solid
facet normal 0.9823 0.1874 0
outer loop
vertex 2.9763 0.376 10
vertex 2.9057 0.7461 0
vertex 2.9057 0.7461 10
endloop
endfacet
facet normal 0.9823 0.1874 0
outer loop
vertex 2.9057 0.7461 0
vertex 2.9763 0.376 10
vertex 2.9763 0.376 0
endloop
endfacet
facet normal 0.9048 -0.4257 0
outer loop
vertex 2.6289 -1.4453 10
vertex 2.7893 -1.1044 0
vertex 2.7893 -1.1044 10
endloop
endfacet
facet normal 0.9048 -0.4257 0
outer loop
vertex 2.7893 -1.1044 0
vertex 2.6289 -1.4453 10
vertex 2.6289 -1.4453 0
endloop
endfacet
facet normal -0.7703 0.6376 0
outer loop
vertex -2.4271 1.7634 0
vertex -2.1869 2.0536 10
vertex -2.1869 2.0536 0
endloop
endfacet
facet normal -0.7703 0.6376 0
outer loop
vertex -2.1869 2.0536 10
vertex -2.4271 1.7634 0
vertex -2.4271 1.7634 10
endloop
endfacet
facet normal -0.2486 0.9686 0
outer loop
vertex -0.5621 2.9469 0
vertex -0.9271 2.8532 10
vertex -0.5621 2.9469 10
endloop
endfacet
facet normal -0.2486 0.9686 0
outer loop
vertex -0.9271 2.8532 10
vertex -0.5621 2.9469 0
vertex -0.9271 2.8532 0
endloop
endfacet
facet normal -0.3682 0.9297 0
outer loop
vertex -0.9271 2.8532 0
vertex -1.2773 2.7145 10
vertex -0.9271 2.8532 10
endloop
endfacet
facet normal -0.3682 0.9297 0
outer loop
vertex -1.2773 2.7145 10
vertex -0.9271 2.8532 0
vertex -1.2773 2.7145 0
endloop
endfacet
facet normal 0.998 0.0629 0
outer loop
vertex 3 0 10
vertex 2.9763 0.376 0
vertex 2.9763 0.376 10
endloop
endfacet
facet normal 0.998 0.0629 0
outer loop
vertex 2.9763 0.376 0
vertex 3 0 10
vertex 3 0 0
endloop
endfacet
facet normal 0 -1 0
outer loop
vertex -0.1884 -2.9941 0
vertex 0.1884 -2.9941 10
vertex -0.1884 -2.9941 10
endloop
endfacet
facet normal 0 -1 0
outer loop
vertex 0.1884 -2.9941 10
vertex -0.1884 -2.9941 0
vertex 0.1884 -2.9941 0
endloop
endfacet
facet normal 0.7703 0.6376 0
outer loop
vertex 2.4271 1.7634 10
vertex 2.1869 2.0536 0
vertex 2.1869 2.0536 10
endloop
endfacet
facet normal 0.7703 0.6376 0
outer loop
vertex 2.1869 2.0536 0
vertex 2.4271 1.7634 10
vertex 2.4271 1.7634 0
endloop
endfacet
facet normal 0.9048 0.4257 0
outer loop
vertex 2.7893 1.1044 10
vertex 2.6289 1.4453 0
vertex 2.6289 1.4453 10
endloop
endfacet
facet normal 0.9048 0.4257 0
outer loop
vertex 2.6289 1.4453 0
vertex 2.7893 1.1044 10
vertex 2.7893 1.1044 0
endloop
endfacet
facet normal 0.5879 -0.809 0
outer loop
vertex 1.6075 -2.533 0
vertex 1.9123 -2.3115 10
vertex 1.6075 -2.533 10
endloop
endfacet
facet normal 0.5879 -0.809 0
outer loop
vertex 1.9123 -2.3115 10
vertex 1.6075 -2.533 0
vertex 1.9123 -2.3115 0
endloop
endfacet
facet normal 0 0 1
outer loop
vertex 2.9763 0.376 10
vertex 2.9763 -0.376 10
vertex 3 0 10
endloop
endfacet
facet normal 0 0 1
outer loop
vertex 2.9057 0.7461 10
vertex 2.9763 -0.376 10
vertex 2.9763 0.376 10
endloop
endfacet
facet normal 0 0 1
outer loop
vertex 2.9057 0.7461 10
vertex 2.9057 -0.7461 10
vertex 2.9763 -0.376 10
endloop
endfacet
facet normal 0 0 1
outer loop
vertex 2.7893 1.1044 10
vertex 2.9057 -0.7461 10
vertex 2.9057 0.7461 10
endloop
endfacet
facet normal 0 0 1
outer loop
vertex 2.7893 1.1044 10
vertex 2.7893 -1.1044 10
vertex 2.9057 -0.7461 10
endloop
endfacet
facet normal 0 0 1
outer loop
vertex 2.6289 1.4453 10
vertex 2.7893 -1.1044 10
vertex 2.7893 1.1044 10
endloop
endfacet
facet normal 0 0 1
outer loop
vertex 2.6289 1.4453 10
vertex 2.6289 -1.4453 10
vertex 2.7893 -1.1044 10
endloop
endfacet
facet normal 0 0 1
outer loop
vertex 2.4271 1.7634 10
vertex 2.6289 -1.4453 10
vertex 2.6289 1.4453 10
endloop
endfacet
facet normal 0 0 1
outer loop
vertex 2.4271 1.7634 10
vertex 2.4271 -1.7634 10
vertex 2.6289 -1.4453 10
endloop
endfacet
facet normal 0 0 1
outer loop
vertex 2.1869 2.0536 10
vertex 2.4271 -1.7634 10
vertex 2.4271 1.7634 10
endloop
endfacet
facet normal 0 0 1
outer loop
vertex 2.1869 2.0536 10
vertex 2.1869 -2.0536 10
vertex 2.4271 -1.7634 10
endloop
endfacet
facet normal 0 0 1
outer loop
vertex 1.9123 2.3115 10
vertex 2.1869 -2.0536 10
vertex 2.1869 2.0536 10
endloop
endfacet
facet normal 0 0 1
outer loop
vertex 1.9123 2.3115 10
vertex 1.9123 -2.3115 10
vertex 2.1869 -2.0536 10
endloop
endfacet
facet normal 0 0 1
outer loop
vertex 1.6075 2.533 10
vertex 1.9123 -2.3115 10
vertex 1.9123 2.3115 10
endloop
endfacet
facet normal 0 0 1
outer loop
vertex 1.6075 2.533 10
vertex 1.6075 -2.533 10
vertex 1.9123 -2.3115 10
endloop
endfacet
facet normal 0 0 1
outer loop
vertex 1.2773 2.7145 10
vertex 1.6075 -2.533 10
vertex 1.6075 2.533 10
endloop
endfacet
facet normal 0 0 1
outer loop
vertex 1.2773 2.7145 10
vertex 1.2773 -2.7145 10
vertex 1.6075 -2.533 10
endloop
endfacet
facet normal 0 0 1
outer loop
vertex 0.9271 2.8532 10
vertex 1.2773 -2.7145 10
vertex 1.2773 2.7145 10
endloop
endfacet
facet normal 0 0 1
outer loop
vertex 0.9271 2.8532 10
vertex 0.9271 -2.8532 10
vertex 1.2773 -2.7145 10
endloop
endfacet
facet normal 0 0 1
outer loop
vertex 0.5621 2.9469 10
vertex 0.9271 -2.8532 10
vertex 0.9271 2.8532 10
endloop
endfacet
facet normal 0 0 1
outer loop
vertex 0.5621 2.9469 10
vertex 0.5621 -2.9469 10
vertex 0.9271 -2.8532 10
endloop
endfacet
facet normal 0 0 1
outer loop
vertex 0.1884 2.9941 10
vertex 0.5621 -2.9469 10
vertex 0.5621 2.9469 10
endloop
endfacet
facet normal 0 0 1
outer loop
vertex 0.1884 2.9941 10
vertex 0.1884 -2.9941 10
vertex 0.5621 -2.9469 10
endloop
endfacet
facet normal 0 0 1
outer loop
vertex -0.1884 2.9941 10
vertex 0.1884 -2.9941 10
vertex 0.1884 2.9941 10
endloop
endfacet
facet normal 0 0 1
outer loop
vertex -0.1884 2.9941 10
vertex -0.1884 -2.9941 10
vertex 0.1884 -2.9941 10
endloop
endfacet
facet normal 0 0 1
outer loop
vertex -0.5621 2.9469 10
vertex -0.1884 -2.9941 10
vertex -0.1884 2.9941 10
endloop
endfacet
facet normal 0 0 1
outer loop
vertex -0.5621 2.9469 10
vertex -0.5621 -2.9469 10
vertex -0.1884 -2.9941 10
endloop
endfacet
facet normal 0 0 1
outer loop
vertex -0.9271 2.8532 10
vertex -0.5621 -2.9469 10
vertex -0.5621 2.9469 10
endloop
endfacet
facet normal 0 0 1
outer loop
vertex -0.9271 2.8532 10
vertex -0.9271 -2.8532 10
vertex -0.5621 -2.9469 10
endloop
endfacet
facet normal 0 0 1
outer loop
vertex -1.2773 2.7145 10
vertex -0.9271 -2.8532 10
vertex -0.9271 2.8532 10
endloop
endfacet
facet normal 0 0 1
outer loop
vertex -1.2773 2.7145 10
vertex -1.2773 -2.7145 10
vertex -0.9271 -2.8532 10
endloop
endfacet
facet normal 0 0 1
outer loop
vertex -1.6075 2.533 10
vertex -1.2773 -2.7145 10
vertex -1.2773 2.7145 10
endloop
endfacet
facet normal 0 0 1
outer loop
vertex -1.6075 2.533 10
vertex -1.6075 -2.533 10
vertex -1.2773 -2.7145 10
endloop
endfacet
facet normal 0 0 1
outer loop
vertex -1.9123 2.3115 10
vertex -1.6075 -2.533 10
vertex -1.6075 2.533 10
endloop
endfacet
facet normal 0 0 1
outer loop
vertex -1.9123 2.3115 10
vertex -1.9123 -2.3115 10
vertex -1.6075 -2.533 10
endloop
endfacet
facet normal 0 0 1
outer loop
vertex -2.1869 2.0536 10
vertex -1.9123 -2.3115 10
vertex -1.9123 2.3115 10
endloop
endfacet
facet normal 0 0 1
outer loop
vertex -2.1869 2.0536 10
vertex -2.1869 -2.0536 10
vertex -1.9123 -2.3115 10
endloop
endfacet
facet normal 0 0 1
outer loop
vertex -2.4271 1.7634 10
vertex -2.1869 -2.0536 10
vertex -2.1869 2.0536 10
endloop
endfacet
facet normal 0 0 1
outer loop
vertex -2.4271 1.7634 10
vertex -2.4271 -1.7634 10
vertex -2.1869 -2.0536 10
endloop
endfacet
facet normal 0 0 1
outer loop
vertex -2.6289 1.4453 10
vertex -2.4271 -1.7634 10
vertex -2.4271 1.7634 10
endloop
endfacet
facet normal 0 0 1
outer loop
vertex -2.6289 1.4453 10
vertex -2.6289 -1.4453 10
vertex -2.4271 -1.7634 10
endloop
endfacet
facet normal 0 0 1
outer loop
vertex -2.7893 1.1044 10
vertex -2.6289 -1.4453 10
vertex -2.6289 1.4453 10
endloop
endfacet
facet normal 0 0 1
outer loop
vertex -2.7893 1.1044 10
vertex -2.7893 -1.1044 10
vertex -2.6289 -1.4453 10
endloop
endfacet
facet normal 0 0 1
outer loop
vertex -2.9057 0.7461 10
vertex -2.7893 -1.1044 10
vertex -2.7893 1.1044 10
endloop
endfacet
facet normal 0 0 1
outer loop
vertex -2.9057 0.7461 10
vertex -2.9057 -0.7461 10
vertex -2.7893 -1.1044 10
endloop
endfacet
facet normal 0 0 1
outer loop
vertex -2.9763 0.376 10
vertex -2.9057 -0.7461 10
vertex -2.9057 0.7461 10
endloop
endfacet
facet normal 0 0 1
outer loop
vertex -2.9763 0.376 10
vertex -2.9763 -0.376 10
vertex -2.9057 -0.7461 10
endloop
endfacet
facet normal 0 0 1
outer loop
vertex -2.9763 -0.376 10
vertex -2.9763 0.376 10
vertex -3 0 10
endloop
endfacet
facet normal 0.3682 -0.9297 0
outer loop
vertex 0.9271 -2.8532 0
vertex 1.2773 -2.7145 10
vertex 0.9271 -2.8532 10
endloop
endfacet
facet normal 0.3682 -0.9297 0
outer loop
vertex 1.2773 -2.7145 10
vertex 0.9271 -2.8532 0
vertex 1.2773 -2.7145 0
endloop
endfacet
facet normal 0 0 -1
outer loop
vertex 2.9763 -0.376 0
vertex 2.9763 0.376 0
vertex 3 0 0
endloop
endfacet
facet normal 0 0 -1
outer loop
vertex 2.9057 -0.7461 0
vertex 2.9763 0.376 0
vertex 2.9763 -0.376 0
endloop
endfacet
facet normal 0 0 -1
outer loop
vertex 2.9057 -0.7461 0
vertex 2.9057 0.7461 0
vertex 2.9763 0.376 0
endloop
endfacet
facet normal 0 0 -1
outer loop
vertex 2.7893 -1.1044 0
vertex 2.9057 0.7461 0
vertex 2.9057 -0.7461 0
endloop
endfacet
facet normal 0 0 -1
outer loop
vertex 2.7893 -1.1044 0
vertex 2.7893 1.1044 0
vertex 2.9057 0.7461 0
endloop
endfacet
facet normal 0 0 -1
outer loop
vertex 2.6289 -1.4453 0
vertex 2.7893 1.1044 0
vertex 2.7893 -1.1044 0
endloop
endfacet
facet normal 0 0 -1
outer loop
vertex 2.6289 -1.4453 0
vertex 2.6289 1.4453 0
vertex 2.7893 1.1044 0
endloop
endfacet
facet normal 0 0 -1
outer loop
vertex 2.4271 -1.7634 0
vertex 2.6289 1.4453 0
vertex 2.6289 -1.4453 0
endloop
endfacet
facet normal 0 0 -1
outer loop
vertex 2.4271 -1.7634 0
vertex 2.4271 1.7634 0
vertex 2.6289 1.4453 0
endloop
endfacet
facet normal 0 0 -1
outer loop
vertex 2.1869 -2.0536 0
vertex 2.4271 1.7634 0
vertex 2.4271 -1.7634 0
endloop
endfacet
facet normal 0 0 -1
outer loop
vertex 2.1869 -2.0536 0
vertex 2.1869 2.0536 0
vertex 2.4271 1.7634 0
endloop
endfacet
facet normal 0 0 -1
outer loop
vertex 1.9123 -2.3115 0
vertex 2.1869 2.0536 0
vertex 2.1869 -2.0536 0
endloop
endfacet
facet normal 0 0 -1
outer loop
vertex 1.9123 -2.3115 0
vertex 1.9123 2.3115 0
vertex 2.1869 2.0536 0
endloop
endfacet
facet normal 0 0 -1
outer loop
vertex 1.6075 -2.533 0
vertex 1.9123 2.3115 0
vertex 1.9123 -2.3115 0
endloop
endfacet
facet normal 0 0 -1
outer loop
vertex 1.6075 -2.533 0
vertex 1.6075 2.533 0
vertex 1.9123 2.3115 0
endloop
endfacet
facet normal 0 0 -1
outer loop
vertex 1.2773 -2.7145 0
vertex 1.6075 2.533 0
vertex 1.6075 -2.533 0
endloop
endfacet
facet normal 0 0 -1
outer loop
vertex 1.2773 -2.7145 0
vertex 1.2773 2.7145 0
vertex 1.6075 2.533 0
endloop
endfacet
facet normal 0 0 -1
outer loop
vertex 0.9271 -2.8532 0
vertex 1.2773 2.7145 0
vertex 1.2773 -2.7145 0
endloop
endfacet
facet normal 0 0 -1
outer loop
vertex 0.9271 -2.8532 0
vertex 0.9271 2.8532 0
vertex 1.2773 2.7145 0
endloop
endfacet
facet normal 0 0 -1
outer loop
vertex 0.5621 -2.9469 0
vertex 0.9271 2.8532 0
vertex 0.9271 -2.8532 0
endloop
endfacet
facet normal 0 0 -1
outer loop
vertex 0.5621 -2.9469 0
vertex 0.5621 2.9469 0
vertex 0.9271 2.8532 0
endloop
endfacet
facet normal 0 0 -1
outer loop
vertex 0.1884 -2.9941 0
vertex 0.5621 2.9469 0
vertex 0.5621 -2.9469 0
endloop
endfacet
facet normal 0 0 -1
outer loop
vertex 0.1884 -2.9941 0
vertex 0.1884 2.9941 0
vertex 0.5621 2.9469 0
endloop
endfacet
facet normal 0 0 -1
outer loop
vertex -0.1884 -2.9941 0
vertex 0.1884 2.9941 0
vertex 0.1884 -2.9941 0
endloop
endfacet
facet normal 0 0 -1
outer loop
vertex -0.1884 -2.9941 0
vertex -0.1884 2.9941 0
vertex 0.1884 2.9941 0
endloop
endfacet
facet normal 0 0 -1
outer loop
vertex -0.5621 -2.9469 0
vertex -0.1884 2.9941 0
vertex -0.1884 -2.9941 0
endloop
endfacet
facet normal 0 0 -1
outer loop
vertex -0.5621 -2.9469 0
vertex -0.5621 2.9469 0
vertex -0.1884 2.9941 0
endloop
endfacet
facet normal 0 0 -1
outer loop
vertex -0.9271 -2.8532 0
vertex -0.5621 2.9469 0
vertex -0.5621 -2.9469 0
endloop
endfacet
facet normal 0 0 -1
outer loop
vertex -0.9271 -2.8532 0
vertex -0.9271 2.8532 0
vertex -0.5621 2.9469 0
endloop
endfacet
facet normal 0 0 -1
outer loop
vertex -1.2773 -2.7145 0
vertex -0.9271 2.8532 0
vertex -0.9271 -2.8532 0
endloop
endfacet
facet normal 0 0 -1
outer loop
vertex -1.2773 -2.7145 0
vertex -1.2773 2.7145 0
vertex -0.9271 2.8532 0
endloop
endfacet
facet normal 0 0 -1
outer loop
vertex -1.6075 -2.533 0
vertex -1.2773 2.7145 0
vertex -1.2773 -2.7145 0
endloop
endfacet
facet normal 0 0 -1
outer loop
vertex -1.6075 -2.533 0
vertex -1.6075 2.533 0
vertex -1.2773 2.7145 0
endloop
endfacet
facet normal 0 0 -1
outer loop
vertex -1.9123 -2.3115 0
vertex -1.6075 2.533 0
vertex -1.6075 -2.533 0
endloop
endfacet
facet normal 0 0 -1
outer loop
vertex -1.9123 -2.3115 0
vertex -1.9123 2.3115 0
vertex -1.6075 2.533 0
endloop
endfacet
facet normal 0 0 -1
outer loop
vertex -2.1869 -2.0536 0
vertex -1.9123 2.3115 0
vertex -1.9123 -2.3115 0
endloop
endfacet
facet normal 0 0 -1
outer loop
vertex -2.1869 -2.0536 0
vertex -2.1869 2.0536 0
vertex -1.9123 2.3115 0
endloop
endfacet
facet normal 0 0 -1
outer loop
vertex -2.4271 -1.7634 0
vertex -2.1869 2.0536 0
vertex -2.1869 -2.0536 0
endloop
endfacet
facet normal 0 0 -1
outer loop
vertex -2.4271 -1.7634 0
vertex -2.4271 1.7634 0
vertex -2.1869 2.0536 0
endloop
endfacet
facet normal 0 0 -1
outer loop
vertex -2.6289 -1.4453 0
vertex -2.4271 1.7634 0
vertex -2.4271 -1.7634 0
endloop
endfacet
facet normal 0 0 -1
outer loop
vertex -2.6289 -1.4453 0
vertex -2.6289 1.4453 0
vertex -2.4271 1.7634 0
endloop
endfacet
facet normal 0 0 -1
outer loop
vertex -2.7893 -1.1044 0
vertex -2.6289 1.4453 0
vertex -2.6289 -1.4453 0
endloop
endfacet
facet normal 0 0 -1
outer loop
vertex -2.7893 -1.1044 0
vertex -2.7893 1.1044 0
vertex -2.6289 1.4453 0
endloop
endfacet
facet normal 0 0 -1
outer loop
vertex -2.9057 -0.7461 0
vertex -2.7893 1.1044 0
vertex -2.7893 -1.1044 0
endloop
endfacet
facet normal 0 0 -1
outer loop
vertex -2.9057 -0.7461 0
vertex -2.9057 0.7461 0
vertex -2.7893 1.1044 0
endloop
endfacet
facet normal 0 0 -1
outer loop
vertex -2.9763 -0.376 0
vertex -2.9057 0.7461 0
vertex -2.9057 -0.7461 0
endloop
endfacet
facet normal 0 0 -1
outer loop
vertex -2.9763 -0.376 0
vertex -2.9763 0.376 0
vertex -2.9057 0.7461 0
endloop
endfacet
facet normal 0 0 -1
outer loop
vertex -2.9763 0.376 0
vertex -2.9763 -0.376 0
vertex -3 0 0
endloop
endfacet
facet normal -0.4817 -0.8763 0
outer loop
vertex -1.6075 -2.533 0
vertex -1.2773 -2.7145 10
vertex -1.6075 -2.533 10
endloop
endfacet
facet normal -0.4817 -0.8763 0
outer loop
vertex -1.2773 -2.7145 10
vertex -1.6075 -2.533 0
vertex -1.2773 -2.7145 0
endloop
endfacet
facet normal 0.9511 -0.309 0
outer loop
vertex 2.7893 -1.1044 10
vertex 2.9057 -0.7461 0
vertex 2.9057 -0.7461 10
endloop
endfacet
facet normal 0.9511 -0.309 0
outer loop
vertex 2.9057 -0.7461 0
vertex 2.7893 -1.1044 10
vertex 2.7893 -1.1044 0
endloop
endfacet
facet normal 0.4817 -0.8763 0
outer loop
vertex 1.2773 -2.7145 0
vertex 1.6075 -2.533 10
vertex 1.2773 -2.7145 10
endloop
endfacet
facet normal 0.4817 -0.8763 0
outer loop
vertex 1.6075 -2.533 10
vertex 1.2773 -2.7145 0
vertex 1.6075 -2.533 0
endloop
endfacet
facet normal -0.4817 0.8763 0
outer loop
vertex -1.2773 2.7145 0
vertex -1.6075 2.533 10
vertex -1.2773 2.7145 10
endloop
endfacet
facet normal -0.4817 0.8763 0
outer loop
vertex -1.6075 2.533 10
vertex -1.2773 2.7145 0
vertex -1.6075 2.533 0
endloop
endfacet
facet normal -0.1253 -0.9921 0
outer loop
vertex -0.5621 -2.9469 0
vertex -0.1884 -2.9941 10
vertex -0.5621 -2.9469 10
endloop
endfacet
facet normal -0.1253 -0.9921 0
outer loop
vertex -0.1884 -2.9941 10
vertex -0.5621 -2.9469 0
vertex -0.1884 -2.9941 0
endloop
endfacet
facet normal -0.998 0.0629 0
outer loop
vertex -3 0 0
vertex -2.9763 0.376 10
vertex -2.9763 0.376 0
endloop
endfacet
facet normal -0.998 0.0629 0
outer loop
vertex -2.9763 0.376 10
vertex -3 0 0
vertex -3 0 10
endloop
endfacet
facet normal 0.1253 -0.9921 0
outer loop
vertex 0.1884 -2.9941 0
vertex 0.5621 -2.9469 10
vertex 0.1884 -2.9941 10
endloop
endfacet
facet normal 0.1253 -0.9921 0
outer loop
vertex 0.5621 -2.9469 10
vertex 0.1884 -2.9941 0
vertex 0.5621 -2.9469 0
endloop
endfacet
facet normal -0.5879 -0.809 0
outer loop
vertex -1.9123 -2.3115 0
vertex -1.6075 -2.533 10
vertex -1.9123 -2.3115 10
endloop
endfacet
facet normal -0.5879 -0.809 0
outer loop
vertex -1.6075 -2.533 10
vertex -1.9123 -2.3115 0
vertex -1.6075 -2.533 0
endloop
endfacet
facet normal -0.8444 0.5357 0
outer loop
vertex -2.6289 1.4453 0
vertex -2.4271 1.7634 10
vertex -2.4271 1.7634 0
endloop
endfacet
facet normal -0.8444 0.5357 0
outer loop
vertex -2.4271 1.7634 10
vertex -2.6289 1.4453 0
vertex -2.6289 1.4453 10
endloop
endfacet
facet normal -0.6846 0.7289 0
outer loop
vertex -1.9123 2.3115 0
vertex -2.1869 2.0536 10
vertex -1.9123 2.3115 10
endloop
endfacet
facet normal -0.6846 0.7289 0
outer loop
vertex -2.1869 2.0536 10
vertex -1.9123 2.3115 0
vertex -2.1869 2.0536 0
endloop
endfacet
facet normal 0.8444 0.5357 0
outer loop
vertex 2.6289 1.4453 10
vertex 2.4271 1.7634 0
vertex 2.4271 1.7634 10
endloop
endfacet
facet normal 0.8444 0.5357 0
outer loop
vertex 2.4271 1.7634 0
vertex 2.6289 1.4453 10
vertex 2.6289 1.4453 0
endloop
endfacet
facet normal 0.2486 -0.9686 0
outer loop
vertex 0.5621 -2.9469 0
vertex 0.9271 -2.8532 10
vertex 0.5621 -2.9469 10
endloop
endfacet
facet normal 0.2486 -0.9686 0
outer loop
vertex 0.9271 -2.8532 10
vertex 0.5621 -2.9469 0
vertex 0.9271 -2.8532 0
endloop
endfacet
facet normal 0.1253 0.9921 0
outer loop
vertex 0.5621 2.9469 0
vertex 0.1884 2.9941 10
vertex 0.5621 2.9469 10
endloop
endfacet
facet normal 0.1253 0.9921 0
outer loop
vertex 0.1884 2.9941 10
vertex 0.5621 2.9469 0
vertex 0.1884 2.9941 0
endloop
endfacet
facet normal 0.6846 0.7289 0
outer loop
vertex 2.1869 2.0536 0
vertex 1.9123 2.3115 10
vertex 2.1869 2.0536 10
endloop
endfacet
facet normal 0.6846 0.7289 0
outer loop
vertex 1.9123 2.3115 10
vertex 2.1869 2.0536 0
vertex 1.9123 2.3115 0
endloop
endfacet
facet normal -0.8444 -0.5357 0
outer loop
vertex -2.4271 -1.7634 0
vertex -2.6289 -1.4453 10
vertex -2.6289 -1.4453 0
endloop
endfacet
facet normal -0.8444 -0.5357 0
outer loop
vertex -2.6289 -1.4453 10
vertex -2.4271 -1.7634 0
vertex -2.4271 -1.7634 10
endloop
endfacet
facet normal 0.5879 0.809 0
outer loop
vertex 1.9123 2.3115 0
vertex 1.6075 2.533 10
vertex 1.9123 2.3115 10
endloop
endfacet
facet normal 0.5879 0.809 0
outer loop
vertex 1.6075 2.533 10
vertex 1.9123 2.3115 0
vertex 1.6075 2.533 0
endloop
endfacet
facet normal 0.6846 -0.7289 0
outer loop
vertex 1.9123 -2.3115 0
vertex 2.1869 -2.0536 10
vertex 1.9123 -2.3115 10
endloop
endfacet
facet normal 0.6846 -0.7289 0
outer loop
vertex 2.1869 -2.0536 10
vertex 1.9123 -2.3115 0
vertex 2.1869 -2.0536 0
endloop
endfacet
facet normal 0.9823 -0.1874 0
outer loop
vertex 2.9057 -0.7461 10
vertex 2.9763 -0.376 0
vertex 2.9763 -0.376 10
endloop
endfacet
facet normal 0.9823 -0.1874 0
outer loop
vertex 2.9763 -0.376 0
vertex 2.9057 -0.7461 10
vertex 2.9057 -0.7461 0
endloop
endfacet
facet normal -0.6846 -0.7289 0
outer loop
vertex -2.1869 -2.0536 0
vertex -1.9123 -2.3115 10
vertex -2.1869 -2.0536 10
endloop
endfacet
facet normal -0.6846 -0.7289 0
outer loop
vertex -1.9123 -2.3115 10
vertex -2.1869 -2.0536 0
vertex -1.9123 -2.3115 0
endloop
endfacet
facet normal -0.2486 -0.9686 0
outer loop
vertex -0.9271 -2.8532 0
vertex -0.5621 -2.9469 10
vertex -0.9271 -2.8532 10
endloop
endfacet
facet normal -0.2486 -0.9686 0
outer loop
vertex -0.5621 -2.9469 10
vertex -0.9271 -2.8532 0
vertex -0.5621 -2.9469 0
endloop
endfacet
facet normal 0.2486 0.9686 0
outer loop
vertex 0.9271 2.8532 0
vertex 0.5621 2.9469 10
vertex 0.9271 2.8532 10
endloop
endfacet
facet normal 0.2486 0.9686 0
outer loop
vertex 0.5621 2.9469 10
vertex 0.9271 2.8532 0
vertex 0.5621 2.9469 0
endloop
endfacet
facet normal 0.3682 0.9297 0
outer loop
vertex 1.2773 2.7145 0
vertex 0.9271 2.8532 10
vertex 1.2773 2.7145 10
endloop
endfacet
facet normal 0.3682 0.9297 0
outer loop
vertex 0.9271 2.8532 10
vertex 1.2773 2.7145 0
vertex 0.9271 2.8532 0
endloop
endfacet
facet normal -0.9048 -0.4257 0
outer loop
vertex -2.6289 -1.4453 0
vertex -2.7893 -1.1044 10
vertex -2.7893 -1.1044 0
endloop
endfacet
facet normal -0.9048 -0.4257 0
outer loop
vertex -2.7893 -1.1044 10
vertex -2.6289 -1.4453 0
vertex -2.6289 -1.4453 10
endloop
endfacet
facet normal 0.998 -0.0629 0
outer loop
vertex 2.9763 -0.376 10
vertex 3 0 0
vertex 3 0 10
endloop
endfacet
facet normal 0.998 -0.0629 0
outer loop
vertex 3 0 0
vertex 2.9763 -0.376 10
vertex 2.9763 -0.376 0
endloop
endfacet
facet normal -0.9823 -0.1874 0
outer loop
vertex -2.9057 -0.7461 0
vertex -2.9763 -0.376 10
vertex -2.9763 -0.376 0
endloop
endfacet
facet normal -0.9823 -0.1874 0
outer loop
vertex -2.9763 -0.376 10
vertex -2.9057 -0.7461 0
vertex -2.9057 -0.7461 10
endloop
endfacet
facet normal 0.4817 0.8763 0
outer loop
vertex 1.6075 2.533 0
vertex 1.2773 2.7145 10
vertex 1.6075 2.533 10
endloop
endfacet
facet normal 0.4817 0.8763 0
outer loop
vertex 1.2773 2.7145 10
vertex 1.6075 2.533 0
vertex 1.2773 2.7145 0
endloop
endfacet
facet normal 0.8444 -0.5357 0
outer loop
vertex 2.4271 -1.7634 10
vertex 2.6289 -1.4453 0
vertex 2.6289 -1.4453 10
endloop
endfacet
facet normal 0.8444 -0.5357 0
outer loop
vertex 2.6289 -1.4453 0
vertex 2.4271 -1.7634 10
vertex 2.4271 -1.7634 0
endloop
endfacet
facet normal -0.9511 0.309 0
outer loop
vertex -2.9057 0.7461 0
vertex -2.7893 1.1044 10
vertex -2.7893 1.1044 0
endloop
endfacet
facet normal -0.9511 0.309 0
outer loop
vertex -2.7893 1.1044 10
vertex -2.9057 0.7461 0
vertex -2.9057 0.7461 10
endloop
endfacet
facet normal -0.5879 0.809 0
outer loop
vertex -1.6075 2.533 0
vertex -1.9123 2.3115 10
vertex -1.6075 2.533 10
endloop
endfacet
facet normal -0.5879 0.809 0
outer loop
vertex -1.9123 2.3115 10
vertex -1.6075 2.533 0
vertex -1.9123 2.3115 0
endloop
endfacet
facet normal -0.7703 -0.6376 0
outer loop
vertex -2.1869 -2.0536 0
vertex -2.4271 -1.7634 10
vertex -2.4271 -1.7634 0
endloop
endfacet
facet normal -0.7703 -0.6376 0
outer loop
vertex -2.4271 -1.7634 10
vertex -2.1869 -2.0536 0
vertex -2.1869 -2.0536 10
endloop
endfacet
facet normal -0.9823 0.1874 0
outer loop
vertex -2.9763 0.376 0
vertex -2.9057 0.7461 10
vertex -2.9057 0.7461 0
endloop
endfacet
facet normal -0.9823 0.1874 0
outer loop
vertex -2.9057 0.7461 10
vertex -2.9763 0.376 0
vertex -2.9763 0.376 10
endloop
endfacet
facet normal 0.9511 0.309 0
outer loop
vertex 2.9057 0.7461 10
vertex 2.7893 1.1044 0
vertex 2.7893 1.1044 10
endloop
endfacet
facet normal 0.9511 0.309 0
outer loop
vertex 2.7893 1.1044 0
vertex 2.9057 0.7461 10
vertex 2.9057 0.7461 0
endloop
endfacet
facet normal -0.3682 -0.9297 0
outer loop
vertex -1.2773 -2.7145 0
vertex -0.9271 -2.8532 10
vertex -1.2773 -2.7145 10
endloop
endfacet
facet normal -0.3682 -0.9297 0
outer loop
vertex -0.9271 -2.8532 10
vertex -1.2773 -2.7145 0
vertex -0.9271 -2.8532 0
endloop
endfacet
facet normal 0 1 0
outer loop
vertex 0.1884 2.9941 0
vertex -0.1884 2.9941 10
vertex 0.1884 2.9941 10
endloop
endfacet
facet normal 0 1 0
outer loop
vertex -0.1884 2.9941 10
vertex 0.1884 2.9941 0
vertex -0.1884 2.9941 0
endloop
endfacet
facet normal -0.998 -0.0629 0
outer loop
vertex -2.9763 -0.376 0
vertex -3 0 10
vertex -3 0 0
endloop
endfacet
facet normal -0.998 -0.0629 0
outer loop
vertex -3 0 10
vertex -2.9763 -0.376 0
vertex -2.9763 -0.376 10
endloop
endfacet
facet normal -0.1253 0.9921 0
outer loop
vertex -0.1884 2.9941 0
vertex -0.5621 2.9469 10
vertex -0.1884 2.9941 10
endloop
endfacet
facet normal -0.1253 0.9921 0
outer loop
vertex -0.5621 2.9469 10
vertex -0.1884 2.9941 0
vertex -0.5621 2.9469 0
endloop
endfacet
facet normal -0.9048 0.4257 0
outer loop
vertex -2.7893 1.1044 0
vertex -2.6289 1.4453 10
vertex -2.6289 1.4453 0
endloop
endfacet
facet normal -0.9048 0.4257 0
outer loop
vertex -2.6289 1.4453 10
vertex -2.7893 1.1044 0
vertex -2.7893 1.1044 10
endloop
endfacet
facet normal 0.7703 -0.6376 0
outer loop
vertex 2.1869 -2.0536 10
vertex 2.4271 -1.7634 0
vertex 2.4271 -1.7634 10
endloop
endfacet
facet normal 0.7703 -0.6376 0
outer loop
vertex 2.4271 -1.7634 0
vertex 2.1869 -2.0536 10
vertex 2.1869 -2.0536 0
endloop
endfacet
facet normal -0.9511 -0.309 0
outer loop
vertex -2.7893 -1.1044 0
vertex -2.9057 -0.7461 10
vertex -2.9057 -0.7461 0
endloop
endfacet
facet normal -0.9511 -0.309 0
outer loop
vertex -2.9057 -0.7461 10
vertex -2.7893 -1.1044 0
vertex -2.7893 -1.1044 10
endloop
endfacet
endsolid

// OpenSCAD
$fn = 50;

difference() {
	union() {
		cylinder(h = 10, r = 3);
	}
	union();
}
